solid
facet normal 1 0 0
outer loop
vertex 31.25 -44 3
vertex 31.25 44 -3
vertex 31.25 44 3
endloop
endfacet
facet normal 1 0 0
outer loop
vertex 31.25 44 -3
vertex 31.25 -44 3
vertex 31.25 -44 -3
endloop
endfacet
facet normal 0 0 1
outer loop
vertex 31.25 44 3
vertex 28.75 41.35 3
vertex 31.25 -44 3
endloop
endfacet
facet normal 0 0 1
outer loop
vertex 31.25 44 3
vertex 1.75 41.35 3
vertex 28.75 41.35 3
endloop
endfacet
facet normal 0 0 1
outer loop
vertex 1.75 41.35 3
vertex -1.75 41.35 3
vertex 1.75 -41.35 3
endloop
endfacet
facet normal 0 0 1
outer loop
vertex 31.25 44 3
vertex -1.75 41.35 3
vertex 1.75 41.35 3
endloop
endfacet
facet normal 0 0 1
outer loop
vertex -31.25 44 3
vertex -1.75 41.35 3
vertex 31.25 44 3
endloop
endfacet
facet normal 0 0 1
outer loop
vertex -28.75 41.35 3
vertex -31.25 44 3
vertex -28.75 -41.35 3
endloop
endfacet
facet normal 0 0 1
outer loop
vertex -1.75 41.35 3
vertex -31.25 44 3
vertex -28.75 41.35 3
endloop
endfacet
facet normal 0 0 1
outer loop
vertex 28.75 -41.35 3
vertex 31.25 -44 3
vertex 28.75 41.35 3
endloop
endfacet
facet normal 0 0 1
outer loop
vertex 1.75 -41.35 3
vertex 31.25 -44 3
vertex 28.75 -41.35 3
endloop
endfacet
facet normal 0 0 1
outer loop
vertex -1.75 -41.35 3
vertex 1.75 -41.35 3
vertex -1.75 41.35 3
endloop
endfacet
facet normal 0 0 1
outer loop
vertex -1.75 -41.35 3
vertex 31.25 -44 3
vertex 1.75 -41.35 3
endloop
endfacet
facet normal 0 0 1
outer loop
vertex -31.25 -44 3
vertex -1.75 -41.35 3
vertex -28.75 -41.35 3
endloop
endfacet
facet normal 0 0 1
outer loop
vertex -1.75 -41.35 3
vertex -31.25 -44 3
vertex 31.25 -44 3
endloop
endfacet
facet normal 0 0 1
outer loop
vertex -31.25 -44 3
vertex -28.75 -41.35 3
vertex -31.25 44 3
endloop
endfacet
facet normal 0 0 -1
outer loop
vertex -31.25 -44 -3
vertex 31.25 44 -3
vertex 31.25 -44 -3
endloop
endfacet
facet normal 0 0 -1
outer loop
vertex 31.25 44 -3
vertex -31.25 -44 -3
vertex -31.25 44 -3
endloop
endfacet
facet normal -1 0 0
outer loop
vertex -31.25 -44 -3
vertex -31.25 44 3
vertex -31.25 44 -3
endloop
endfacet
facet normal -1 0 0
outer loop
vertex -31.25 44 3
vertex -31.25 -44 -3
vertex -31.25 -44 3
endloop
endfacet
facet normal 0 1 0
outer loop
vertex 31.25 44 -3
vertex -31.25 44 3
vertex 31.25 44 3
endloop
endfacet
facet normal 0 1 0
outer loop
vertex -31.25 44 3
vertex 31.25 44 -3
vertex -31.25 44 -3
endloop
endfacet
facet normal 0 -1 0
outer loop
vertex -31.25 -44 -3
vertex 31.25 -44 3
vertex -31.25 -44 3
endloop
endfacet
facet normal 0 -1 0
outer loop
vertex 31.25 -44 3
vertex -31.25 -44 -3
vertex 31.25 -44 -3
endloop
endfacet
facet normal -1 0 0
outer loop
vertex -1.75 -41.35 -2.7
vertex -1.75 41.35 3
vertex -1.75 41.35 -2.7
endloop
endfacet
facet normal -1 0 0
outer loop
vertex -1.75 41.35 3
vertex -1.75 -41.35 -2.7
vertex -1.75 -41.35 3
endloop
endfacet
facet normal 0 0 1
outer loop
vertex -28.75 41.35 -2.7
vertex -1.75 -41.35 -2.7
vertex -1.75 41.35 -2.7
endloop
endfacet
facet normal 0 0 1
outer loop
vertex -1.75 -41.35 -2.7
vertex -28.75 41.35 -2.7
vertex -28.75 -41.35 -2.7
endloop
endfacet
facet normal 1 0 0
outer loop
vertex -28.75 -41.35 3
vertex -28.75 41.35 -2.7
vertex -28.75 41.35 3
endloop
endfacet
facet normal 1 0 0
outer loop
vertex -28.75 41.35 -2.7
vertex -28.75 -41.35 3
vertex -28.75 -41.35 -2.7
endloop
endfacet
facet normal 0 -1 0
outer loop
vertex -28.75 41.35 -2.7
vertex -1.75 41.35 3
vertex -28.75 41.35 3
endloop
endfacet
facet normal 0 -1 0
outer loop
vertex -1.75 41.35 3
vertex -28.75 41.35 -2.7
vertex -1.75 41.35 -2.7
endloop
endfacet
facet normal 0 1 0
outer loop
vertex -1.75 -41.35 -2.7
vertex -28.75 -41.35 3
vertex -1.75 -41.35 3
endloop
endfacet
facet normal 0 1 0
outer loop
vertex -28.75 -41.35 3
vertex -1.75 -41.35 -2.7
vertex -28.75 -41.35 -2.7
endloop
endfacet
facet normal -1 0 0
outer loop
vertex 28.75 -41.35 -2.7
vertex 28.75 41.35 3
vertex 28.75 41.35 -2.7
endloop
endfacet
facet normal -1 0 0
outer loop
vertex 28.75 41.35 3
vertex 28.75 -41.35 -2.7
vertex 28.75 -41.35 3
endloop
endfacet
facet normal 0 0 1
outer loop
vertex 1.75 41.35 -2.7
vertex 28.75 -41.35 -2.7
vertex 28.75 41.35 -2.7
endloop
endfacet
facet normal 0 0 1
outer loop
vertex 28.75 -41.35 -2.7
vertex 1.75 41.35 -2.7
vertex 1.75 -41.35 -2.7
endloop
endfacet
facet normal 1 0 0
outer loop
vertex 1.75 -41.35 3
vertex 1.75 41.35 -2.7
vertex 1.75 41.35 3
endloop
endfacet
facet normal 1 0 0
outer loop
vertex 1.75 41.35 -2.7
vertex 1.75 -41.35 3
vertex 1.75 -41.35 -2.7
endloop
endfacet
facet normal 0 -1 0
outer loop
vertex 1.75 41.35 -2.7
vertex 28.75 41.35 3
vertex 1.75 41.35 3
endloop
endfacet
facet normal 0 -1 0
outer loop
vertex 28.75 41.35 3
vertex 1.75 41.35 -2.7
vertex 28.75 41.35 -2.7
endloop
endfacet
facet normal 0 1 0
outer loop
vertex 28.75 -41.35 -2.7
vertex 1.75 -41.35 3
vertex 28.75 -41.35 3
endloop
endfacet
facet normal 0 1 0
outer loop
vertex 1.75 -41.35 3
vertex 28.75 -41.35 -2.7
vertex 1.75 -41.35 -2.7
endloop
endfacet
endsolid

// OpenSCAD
// ============================================================================
// Project: Breadboard Base Plate with Cutouts (OpenSCAD)
// Author: Semih Agcaer
// License: Creative Commons Attribution-ShareAlike 4.0 International (CC BY-SA 4.0)
// 
// You are free to:
//   - Share — copy and redistribute the material in any medium or format
//   - Adapt — remix, transform, and build upon the material
//
// Under the following terms:
//   • Attribution — You must give appropriate credit.
//   • ShareAlike — If you remix, transform, or build upon the material,
//                  you must distribute your contributions under the same license.
//
// Full license text:
// https://creativecommons.org/licenses/by-sa/4.0/
// ============================================================================
//
// -----------------------------------------------------------------------------
// Parametric base plate with four rectangular cutouts
// Designed for breadboard mounting
// All dimensions in millimeters
// -----------------------------------------------------------------------------

// --- Main body dimensions ---
c = 0;                      // two cutouts: 'c = 0' and four cutouts 'c = 1' 
main_x =(c==0) ? 62.5 : (62.5 + 22 + 22);   // Total width (breadboard width + two 22 mm sides)

main_y = 88;               // Total length
main_z = 6;                // Total thickness

// --- Cutout dimensions ---
cut_width  = 27;           // Short dimension of each cutout (aligned with 'main_x')
cut_length = 82.7;         // Long dimension of each cutout (aligned with 'main_y')
cut_height = 5.7;          // Depth of cutouts (leaving 'main_z - cut_height' bottom thickness)
gap = main_z - 2.5;        // Gap between left/right cutouts 

bottom_thickness = main_z - cut_height; //Bottom thickness of cutouts 

difference() {

    // MAIN BODY (centered)
    cube([main_x, main_y, main_z], center = true);
       
    // MAIN PAIR OF CUTOUTS (equal size, left & right)
    // Offset in x direction: 'cut_width/2' plus half of 'gap'.
    // The body spans from '-main_z/2' to '+main_z/2' in Z direction.
    cut_center_z = -main_z/2 + cut_height/2 + bottom_thickness;  
    // Left cutout
    translate([-(cut_width/2 + gap/2), 0, cut_center_z])
        cube([cut_width, cut_length, cut_height], center = true);

    // Right cutout
    translate([+(cut_width/2 + gap/2), 0, cut_center_z])
        cube([cut_width, cut_length, cut_height], center = true);

    // SECONDARY PAIR OF NARROWER CUTOUTS
    // These appear (if 'c = 1') shifted farther outward and slightly narrower ('cut_width' - 9mm)

    // Right-side narrow cutout. power supply part is 9mm width -> 'cut_width - 9' 
    translate([+cut_width/2 + gap/2 + 11, 0, 0])
        translate([+(cut_width/2 + gap/2), 0, cut_center_z])
            cube([cut_width - 9, cut_length, cut_height], center = true);

    // Left-side narrow cutout. power supply part is 9mm width -> 'cut_width - 9' 
    translate([-cut_width/2 - gap/2 - 11, 0, 0])
        translate([-(cut_width/2 + gap/2), 0, cut_center_z])
            cube([cut_width - 9, cut_length, cut_height], center = true);

}
